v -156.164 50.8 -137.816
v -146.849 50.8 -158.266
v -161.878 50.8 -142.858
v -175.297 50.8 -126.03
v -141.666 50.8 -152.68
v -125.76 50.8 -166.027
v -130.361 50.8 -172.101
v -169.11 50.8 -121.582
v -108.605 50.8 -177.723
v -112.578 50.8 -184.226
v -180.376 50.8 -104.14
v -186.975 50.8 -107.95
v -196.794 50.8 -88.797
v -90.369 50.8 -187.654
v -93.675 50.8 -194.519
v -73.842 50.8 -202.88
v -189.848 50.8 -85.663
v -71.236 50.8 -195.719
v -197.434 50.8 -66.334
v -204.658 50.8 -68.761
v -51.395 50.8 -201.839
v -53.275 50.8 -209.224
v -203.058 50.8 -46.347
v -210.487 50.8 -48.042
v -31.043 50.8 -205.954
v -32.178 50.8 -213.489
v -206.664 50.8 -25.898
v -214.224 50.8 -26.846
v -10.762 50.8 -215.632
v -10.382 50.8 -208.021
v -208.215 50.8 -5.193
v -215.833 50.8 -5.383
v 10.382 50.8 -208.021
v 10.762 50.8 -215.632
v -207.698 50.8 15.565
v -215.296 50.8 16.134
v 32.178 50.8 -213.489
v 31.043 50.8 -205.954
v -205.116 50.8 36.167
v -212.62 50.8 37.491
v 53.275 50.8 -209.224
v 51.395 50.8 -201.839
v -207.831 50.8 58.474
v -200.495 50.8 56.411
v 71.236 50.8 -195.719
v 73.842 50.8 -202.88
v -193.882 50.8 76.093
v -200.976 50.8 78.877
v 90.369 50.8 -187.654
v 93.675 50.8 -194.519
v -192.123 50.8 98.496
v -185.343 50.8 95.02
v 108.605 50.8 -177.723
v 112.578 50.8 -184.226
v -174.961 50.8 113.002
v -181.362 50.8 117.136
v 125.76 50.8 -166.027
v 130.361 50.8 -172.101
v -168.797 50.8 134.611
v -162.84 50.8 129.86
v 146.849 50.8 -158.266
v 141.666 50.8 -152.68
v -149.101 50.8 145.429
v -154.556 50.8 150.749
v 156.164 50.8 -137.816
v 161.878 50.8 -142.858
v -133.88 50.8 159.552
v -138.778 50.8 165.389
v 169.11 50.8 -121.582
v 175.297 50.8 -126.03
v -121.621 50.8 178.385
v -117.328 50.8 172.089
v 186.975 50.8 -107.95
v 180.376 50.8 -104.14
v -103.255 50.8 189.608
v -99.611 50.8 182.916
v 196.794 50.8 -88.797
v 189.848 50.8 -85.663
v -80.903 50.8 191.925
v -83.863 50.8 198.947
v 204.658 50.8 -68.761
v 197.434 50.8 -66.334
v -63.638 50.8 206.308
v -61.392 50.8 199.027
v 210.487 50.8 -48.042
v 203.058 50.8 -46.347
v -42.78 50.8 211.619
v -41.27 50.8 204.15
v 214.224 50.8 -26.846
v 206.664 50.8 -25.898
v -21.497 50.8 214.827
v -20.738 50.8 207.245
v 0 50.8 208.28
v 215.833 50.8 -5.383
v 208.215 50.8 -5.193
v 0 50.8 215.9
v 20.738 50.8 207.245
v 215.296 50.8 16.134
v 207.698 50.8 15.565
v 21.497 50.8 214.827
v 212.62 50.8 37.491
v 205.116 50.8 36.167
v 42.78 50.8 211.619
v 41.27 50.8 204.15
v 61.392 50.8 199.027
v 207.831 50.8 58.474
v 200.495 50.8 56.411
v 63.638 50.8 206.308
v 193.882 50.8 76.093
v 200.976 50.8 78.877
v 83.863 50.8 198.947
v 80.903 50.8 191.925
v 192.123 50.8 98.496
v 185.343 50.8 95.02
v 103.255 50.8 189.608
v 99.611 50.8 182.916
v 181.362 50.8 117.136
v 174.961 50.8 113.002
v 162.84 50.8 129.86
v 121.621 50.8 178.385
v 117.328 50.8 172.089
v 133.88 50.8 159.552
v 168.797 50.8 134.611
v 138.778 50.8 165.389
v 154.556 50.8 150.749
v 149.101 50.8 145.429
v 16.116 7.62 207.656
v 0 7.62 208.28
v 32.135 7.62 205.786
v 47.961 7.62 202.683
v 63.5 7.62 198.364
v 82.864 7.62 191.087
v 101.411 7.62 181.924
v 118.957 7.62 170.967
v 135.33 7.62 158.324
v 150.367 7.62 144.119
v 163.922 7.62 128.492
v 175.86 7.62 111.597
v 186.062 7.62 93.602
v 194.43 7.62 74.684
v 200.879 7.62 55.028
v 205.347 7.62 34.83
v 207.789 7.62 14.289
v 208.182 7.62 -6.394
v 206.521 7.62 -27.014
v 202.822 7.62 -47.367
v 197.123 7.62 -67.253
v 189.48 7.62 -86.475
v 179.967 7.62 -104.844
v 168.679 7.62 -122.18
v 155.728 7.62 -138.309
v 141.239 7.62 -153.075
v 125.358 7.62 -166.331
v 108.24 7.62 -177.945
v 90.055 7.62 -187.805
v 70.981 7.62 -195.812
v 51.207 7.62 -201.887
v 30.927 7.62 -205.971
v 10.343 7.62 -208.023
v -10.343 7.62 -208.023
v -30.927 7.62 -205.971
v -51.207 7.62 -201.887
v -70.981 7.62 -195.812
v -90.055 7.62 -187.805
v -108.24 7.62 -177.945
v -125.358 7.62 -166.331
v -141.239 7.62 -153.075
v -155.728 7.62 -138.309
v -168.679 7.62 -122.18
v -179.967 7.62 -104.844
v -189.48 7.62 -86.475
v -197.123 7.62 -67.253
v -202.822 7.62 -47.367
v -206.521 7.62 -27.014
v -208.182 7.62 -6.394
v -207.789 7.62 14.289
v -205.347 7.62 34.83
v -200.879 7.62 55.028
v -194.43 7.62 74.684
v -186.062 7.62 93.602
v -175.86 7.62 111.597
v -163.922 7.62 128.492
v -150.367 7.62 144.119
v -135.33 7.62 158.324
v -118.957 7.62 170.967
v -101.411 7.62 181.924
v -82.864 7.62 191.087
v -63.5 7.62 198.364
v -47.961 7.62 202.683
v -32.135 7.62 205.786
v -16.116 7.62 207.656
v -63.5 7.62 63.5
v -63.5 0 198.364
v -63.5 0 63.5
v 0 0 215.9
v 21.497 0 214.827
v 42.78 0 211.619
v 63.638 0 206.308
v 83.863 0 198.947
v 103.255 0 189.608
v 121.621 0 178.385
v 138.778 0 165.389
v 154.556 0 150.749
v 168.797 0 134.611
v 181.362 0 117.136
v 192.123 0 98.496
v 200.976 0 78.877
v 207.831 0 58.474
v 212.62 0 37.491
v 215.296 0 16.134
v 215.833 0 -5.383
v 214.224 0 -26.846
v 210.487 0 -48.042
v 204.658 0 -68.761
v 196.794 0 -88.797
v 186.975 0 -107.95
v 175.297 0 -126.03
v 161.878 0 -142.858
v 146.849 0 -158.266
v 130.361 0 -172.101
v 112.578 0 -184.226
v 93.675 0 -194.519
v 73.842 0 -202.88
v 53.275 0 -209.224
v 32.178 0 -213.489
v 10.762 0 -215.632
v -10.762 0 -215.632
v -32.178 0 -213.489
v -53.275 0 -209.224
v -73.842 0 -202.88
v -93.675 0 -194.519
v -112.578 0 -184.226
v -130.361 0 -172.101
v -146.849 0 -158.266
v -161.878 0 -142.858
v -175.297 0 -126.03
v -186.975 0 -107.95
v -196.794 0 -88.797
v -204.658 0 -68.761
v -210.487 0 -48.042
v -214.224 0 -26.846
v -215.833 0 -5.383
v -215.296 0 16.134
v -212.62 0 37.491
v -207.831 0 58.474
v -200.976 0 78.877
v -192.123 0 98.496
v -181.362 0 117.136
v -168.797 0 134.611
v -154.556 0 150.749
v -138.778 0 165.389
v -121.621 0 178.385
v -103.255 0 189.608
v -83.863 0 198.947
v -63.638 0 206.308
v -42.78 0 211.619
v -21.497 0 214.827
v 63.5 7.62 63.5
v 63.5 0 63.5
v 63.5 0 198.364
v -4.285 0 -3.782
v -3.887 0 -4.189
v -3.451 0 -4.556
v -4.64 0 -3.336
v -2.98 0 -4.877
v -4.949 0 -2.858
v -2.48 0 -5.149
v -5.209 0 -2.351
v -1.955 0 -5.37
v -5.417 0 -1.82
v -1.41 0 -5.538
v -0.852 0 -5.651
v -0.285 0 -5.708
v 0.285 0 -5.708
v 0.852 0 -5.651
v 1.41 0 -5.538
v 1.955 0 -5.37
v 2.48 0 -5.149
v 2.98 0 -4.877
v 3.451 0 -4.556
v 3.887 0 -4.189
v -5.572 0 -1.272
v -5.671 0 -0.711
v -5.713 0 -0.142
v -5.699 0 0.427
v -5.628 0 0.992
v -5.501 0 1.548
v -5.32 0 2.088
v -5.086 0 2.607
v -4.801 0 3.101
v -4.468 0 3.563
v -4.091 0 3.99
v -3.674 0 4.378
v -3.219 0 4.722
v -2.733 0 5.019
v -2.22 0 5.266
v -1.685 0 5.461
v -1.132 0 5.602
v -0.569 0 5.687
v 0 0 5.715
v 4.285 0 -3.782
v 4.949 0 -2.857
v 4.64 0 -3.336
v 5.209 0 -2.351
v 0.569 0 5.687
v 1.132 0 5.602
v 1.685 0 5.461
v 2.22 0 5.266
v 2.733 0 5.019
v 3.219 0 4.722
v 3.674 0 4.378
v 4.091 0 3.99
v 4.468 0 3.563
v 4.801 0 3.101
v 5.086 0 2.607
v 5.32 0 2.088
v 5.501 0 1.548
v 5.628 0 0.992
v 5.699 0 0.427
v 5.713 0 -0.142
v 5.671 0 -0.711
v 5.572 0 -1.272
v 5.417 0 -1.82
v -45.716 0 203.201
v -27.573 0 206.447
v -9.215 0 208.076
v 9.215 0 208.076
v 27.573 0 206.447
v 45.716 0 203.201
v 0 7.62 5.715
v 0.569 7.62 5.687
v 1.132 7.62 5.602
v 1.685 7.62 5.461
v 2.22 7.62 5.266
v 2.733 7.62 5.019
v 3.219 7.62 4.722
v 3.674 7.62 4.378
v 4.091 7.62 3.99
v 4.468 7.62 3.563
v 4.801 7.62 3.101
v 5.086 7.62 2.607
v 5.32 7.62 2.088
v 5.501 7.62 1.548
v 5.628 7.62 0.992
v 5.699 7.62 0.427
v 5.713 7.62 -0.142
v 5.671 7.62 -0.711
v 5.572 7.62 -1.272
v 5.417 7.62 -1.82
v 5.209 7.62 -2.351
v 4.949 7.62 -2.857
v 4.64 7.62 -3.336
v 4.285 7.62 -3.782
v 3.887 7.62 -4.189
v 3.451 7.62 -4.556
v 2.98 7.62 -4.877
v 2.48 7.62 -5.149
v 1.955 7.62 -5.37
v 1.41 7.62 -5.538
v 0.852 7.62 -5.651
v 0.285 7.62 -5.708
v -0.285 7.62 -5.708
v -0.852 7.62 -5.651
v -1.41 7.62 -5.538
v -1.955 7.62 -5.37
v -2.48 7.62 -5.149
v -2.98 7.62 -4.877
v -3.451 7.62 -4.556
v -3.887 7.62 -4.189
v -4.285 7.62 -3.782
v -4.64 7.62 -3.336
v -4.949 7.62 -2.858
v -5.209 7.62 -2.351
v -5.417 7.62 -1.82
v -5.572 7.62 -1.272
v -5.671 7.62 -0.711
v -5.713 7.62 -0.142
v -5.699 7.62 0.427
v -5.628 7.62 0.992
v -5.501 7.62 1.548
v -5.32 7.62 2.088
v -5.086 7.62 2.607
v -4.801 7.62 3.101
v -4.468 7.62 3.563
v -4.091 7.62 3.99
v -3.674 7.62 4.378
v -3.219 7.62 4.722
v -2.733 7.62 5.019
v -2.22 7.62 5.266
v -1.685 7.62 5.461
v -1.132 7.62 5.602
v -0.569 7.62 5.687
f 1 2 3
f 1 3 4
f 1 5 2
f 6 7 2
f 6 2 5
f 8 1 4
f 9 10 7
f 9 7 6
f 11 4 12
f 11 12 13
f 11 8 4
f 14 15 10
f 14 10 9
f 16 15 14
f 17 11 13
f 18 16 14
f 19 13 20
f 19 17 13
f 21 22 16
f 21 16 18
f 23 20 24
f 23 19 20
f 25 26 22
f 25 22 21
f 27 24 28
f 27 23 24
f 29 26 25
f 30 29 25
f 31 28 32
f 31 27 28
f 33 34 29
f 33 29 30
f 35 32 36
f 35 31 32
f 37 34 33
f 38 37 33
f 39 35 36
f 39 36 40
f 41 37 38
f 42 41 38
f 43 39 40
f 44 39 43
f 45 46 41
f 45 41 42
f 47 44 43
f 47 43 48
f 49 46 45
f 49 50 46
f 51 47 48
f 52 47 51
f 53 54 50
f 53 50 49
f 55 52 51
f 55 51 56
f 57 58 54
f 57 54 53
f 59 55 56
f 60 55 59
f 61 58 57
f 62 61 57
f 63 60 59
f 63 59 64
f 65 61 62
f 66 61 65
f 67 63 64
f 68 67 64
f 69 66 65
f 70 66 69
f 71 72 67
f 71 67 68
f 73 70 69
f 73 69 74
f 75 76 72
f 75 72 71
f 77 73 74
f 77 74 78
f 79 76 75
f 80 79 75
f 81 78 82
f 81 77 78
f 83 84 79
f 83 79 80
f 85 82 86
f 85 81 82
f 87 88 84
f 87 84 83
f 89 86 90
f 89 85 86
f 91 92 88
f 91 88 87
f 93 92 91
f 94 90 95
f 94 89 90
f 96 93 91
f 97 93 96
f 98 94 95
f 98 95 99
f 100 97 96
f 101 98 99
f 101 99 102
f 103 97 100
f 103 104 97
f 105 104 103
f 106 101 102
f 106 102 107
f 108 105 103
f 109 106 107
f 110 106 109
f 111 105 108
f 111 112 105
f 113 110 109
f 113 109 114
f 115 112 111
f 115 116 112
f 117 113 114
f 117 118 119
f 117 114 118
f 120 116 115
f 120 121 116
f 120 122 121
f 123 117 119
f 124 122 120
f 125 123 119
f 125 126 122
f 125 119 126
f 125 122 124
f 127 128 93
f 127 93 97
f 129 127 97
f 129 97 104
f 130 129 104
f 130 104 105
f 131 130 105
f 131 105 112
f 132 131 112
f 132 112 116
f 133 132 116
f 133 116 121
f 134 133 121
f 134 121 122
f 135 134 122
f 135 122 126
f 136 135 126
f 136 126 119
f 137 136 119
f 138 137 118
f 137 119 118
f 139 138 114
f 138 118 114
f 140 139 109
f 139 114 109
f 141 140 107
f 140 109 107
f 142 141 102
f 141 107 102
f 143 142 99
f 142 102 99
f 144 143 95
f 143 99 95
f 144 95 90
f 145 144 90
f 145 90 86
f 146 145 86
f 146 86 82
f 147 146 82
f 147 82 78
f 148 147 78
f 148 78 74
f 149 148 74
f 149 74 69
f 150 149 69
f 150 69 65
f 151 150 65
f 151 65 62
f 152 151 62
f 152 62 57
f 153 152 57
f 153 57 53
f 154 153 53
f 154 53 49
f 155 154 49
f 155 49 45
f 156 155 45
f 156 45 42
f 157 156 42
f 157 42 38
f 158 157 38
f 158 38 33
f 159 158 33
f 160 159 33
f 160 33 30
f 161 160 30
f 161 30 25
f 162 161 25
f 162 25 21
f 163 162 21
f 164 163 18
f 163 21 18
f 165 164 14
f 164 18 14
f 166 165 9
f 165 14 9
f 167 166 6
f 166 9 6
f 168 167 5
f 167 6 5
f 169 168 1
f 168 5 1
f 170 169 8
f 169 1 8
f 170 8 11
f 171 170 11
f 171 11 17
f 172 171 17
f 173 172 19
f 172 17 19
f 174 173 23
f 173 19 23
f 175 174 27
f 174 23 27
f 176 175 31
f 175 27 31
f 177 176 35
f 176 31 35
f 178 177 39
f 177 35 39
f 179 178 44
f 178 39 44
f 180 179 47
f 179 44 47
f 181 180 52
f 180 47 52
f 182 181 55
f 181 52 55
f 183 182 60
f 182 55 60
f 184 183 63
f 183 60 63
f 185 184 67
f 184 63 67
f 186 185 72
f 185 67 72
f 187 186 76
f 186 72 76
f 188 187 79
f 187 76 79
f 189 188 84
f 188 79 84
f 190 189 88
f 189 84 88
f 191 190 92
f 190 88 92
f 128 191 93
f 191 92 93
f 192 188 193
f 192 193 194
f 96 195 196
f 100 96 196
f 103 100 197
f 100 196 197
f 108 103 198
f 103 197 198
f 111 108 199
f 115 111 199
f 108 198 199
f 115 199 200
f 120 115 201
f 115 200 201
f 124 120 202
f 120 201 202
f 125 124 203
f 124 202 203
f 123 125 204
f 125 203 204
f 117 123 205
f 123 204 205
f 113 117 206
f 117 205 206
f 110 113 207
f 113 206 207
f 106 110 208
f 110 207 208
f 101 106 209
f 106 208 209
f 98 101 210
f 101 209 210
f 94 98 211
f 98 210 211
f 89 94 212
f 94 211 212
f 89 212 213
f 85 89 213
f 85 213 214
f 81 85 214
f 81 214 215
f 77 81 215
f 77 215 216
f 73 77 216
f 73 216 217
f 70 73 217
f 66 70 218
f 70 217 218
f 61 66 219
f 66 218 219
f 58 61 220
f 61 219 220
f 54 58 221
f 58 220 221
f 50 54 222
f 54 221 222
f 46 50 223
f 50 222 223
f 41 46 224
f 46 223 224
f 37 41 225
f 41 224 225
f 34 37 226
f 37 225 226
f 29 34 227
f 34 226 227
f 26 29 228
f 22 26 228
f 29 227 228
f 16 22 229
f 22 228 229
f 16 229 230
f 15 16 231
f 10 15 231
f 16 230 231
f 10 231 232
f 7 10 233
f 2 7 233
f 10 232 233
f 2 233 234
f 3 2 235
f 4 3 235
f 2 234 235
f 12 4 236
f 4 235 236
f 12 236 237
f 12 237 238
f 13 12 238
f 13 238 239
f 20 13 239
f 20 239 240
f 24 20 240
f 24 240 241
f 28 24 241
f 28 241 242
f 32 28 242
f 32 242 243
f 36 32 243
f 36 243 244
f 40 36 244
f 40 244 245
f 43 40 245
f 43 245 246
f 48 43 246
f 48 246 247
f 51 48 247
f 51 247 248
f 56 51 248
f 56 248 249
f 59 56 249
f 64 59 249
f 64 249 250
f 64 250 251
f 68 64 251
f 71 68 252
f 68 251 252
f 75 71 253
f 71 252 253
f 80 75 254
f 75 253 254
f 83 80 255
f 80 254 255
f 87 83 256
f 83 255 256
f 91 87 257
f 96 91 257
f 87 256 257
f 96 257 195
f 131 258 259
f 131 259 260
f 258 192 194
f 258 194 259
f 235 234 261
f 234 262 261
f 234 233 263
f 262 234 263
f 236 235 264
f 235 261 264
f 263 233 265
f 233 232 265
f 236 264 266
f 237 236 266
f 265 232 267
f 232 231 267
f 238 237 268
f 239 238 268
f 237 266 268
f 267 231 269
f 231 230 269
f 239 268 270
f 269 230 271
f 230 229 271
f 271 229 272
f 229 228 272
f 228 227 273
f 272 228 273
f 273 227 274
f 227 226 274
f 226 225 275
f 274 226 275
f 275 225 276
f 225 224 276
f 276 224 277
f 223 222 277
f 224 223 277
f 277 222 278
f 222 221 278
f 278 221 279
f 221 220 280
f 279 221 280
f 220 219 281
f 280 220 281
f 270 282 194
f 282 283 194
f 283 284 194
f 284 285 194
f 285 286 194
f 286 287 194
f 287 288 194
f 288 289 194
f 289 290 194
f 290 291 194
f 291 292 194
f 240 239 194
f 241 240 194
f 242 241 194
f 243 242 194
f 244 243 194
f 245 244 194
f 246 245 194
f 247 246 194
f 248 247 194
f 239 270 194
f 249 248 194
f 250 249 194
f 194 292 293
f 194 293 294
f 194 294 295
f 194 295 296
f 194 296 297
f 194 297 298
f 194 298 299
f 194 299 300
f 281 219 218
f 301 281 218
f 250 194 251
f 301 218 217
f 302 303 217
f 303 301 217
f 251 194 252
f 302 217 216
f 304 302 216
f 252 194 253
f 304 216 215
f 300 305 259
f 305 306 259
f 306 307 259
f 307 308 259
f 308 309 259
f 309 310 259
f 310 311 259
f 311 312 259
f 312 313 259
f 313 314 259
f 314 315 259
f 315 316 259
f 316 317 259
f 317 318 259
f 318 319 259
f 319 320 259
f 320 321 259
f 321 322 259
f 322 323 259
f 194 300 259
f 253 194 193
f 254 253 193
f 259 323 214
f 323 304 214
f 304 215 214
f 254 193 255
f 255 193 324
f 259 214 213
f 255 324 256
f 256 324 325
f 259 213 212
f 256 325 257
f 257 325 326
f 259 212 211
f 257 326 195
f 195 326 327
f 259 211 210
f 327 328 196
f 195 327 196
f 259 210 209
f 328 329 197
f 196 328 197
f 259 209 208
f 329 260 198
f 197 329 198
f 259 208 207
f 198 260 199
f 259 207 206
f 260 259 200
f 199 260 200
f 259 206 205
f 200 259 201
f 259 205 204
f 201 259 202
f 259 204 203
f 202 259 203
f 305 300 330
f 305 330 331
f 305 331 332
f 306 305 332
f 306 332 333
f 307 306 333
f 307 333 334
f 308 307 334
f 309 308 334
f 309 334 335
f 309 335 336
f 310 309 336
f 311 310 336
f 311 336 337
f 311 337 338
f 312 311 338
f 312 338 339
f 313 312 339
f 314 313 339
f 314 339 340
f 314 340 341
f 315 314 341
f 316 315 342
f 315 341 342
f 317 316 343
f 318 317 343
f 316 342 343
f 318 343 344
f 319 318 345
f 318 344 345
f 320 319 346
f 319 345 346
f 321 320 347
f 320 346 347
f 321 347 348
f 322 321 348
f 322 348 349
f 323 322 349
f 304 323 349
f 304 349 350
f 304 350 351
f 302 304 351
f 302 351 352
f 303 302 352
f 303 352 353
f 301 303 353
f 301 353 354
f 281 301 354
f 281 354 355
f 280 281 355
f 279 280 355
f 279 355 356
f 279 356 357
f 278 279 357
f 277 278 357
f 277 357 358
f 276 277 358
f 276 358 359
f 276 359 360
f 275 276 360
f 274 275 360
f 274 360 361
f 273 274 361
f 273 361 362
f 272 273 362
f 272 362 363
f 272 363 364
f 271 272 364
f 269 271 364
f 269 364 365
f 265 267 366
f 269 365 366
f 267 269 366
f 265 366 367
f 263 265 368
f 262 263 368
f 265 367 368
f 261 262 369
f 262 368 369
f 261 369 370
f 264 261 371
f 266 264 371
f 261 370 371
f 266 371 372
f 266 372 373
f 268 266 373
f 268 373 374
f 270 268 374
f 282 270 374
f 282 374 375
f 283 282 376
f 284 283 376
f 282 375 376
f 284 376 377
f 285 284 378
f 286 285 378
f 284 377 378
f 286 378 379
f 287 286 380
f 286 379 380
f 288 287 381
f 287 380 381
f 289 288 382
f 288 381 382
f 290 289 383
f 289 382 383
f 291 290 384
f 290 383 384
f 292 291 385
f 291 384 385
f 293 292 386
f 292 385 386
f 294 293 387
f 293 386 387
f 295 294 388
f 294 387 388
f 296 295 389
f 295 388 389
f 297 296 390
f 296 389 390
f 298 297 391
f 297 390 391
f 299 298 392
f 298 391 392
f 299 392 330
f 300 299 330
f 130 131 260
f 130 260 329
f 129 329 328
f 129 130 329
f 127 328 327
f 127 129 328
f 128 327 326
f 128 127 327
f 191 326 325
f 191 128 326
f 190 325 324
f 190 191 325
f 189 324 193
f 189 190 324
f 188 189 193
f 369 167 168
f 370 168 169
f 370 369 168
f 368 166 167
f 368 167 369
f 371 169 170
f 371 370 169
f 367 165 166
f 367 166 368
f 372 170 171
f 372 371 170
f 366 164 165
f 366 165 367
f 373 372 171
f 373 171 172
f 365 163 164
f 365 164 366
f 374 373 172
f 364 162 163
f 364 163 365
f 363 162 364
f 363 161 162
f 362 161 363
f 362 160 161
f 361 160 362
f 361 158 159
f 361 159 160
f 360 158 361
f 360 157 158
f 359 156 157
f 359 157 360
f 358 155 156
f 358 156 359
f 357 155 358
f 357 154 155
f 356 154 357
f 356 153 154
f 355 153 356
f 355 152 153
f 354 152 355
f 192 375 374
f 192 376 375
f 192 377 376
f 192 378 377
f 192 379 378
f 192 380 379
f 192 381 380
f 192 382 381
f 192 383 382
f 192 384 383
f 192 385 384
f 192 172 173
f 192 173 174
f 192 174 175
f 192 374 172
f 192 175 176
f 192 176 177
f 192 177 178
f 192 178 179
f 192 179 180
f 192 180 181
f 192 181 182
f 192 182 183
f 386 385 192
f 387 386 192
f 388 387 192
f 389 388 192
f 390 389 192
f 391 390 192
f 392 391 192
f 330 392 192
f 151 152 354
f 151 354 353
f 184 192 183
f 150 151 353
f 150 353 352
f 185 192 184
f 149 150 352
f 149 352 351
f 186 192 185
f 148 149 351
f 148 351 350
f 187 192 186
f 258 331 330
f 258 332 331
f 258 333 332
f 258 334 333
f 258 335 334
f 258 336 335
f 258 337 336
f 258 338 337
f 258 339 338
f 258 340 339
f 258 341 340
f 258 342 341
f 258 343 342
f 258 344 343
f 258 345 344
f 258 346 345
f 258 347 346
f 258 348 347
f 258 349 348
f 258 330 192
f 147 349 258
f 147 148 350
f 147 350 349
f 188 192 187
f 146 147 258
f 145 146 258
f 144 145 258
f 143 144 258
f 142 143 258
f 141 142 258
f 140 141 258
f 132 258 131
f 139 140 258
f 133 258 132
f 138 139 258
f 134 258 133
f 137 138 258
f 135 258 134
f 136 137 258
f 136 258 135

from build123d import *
from build123d.topology import SkipClean

# Parameters (mm, degrees)
SKETCH1_R           = 215.9
BOSS_EXTRUDE1_DEPTH = 50.8
SKETCH2_R           = 208.28
CUT_EXTRUDE1_DEPTH  = 43.18
CUT_EXTRUDE2_DEPTH  = 309.366879544
SKETCH4_R           = 5.715
CUT_EXTRUDE3_DEPTH  = 309.366879544


with BuildPart() as part:
    # Sketch1 → Boss-Extrude1 (new body)
    with BuildSketch(Plane(origin=(0, 0, 0), x_dir=(1, 0, 0), z_dir=(0, 1, 0))):
        with Locations(Location((0, 0, 0), (0, 0, 270))):
            Circle(SKETCH1_R)
    extrude(amount=BOSS_EXTRUDE1_DEPTH)

    # Sketch2 → Cut-Extrude1 (cut)
    with BuildSketch(Plane(origin=(0, 50.8, 0), x_dir=(1, 0, 0), z_dir=(0, 1, 0))):
        with Locations(Location((0, 0, 0), (0, 0, 270))):
            Circle(SKETCH2_R)
    extrude(amount=-CUT_EXTRUDE1_DEPTH, mode=Mode.SUBTRACT)

    # Sketch3 → Cut-Extrude2 (cut, through all)
    with SkipClean():  # the faces are left unmerged after this step: merging them gives an invalid solid
        with BuildSketch(Plane(origin=(0, 7.62, 0), x_dir=(1, 0, 0), z_dir=(0, 1, 0))):
            with BuildLine():
                Line((-63.5, -63.5), (63.5, -63.5))
                Line((63.5, -63.5), (63.5, -198.364080418))
                ThreePointArc((63.5, -198.364080418), (0, -208.28), (-63.5, -198.364080418))
                Line((-63.5, -198.364080418), (-63.5, -63.5))
            make_face()
        extrude(amount=-CUT_EXTRUDE2_DEPTH, mode=Mode.SUBTRACT)

    # Sketch4 → Cut-Extrude3 (cut, through all)
    with SkipClean():  # the faces are left unmerged after this step: merging them gives an invalid solid
        with BuildSketch(Plane(origin=(0, 7.62, 0), x_dir=(1, 0, 0), z_dir=(0, 1, 0))):
            with Locations(Location((0, 0, 0), (0, 0, 270))):
                Circle(SKETCH4_R)
        extrude(amount=-CUT_EXTRUDE3_DEPTH, mode=Mode.SUBTRACT)


solid = part.part
